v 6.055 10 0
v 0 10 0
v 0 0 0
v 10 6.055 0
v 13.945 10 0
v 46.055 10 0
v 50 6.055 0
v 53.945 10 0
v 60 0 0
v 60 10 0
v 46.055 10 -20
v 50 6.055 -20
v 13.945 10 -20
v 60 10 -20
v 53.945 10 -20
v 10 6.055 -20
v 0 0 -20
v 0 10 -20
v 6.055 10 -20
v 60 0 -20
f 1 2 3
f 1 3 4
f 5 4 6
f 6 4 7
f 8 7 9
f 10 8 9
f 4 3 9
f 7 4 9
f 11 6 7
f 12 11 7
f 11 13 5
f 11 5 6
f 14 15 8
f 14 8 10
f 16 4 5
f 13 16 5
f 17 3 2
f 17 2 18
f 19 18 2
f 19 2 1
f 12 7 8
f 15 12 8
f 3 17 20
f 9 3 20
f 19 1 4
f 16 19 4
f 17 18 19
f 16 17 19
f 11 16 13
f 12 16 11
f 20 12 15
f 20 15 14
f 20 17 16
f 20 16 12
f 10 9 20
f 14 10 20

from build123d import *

# Parameters (mm, degrees)
SKETCH1_W           = 60
SKETCH1_H           = 20
BOSS_EXTRUDE1_DEPTH = 10
CUT_EXTRUDE1_DEPTH  = 65.031242374


with BuildPart() as part:
    # Sketch1 → Boss-Extrude1 (new body)
    with BuildSketch(Plane(origin=(0, 0, 0), x_dir=(1, 0, 0), z_dir=(0, 1, 0))):
        with Locations((30, 10)):
            Rectangle(SKETCH1_W, SKETCH1_H)
    extrude(amount=BOSS_EXTRUDE1_DEPTH)

    # Sketch2 → Cut-Extrude1 (cut, through all)
    with BuildSketch(Plane.XY):
        Polygon((13.94522636, 10), (6.05477364, 10), (10, 6.05477364), align=None)
        Polygon((46.05477364, 10), (50, 6.05477364), (53.94522636, 10), align=None)
    extrude(amount=-CUT_EXTRUDE1_DEPTH, mode=Mode.SUBTRACT)


solid = part.part
